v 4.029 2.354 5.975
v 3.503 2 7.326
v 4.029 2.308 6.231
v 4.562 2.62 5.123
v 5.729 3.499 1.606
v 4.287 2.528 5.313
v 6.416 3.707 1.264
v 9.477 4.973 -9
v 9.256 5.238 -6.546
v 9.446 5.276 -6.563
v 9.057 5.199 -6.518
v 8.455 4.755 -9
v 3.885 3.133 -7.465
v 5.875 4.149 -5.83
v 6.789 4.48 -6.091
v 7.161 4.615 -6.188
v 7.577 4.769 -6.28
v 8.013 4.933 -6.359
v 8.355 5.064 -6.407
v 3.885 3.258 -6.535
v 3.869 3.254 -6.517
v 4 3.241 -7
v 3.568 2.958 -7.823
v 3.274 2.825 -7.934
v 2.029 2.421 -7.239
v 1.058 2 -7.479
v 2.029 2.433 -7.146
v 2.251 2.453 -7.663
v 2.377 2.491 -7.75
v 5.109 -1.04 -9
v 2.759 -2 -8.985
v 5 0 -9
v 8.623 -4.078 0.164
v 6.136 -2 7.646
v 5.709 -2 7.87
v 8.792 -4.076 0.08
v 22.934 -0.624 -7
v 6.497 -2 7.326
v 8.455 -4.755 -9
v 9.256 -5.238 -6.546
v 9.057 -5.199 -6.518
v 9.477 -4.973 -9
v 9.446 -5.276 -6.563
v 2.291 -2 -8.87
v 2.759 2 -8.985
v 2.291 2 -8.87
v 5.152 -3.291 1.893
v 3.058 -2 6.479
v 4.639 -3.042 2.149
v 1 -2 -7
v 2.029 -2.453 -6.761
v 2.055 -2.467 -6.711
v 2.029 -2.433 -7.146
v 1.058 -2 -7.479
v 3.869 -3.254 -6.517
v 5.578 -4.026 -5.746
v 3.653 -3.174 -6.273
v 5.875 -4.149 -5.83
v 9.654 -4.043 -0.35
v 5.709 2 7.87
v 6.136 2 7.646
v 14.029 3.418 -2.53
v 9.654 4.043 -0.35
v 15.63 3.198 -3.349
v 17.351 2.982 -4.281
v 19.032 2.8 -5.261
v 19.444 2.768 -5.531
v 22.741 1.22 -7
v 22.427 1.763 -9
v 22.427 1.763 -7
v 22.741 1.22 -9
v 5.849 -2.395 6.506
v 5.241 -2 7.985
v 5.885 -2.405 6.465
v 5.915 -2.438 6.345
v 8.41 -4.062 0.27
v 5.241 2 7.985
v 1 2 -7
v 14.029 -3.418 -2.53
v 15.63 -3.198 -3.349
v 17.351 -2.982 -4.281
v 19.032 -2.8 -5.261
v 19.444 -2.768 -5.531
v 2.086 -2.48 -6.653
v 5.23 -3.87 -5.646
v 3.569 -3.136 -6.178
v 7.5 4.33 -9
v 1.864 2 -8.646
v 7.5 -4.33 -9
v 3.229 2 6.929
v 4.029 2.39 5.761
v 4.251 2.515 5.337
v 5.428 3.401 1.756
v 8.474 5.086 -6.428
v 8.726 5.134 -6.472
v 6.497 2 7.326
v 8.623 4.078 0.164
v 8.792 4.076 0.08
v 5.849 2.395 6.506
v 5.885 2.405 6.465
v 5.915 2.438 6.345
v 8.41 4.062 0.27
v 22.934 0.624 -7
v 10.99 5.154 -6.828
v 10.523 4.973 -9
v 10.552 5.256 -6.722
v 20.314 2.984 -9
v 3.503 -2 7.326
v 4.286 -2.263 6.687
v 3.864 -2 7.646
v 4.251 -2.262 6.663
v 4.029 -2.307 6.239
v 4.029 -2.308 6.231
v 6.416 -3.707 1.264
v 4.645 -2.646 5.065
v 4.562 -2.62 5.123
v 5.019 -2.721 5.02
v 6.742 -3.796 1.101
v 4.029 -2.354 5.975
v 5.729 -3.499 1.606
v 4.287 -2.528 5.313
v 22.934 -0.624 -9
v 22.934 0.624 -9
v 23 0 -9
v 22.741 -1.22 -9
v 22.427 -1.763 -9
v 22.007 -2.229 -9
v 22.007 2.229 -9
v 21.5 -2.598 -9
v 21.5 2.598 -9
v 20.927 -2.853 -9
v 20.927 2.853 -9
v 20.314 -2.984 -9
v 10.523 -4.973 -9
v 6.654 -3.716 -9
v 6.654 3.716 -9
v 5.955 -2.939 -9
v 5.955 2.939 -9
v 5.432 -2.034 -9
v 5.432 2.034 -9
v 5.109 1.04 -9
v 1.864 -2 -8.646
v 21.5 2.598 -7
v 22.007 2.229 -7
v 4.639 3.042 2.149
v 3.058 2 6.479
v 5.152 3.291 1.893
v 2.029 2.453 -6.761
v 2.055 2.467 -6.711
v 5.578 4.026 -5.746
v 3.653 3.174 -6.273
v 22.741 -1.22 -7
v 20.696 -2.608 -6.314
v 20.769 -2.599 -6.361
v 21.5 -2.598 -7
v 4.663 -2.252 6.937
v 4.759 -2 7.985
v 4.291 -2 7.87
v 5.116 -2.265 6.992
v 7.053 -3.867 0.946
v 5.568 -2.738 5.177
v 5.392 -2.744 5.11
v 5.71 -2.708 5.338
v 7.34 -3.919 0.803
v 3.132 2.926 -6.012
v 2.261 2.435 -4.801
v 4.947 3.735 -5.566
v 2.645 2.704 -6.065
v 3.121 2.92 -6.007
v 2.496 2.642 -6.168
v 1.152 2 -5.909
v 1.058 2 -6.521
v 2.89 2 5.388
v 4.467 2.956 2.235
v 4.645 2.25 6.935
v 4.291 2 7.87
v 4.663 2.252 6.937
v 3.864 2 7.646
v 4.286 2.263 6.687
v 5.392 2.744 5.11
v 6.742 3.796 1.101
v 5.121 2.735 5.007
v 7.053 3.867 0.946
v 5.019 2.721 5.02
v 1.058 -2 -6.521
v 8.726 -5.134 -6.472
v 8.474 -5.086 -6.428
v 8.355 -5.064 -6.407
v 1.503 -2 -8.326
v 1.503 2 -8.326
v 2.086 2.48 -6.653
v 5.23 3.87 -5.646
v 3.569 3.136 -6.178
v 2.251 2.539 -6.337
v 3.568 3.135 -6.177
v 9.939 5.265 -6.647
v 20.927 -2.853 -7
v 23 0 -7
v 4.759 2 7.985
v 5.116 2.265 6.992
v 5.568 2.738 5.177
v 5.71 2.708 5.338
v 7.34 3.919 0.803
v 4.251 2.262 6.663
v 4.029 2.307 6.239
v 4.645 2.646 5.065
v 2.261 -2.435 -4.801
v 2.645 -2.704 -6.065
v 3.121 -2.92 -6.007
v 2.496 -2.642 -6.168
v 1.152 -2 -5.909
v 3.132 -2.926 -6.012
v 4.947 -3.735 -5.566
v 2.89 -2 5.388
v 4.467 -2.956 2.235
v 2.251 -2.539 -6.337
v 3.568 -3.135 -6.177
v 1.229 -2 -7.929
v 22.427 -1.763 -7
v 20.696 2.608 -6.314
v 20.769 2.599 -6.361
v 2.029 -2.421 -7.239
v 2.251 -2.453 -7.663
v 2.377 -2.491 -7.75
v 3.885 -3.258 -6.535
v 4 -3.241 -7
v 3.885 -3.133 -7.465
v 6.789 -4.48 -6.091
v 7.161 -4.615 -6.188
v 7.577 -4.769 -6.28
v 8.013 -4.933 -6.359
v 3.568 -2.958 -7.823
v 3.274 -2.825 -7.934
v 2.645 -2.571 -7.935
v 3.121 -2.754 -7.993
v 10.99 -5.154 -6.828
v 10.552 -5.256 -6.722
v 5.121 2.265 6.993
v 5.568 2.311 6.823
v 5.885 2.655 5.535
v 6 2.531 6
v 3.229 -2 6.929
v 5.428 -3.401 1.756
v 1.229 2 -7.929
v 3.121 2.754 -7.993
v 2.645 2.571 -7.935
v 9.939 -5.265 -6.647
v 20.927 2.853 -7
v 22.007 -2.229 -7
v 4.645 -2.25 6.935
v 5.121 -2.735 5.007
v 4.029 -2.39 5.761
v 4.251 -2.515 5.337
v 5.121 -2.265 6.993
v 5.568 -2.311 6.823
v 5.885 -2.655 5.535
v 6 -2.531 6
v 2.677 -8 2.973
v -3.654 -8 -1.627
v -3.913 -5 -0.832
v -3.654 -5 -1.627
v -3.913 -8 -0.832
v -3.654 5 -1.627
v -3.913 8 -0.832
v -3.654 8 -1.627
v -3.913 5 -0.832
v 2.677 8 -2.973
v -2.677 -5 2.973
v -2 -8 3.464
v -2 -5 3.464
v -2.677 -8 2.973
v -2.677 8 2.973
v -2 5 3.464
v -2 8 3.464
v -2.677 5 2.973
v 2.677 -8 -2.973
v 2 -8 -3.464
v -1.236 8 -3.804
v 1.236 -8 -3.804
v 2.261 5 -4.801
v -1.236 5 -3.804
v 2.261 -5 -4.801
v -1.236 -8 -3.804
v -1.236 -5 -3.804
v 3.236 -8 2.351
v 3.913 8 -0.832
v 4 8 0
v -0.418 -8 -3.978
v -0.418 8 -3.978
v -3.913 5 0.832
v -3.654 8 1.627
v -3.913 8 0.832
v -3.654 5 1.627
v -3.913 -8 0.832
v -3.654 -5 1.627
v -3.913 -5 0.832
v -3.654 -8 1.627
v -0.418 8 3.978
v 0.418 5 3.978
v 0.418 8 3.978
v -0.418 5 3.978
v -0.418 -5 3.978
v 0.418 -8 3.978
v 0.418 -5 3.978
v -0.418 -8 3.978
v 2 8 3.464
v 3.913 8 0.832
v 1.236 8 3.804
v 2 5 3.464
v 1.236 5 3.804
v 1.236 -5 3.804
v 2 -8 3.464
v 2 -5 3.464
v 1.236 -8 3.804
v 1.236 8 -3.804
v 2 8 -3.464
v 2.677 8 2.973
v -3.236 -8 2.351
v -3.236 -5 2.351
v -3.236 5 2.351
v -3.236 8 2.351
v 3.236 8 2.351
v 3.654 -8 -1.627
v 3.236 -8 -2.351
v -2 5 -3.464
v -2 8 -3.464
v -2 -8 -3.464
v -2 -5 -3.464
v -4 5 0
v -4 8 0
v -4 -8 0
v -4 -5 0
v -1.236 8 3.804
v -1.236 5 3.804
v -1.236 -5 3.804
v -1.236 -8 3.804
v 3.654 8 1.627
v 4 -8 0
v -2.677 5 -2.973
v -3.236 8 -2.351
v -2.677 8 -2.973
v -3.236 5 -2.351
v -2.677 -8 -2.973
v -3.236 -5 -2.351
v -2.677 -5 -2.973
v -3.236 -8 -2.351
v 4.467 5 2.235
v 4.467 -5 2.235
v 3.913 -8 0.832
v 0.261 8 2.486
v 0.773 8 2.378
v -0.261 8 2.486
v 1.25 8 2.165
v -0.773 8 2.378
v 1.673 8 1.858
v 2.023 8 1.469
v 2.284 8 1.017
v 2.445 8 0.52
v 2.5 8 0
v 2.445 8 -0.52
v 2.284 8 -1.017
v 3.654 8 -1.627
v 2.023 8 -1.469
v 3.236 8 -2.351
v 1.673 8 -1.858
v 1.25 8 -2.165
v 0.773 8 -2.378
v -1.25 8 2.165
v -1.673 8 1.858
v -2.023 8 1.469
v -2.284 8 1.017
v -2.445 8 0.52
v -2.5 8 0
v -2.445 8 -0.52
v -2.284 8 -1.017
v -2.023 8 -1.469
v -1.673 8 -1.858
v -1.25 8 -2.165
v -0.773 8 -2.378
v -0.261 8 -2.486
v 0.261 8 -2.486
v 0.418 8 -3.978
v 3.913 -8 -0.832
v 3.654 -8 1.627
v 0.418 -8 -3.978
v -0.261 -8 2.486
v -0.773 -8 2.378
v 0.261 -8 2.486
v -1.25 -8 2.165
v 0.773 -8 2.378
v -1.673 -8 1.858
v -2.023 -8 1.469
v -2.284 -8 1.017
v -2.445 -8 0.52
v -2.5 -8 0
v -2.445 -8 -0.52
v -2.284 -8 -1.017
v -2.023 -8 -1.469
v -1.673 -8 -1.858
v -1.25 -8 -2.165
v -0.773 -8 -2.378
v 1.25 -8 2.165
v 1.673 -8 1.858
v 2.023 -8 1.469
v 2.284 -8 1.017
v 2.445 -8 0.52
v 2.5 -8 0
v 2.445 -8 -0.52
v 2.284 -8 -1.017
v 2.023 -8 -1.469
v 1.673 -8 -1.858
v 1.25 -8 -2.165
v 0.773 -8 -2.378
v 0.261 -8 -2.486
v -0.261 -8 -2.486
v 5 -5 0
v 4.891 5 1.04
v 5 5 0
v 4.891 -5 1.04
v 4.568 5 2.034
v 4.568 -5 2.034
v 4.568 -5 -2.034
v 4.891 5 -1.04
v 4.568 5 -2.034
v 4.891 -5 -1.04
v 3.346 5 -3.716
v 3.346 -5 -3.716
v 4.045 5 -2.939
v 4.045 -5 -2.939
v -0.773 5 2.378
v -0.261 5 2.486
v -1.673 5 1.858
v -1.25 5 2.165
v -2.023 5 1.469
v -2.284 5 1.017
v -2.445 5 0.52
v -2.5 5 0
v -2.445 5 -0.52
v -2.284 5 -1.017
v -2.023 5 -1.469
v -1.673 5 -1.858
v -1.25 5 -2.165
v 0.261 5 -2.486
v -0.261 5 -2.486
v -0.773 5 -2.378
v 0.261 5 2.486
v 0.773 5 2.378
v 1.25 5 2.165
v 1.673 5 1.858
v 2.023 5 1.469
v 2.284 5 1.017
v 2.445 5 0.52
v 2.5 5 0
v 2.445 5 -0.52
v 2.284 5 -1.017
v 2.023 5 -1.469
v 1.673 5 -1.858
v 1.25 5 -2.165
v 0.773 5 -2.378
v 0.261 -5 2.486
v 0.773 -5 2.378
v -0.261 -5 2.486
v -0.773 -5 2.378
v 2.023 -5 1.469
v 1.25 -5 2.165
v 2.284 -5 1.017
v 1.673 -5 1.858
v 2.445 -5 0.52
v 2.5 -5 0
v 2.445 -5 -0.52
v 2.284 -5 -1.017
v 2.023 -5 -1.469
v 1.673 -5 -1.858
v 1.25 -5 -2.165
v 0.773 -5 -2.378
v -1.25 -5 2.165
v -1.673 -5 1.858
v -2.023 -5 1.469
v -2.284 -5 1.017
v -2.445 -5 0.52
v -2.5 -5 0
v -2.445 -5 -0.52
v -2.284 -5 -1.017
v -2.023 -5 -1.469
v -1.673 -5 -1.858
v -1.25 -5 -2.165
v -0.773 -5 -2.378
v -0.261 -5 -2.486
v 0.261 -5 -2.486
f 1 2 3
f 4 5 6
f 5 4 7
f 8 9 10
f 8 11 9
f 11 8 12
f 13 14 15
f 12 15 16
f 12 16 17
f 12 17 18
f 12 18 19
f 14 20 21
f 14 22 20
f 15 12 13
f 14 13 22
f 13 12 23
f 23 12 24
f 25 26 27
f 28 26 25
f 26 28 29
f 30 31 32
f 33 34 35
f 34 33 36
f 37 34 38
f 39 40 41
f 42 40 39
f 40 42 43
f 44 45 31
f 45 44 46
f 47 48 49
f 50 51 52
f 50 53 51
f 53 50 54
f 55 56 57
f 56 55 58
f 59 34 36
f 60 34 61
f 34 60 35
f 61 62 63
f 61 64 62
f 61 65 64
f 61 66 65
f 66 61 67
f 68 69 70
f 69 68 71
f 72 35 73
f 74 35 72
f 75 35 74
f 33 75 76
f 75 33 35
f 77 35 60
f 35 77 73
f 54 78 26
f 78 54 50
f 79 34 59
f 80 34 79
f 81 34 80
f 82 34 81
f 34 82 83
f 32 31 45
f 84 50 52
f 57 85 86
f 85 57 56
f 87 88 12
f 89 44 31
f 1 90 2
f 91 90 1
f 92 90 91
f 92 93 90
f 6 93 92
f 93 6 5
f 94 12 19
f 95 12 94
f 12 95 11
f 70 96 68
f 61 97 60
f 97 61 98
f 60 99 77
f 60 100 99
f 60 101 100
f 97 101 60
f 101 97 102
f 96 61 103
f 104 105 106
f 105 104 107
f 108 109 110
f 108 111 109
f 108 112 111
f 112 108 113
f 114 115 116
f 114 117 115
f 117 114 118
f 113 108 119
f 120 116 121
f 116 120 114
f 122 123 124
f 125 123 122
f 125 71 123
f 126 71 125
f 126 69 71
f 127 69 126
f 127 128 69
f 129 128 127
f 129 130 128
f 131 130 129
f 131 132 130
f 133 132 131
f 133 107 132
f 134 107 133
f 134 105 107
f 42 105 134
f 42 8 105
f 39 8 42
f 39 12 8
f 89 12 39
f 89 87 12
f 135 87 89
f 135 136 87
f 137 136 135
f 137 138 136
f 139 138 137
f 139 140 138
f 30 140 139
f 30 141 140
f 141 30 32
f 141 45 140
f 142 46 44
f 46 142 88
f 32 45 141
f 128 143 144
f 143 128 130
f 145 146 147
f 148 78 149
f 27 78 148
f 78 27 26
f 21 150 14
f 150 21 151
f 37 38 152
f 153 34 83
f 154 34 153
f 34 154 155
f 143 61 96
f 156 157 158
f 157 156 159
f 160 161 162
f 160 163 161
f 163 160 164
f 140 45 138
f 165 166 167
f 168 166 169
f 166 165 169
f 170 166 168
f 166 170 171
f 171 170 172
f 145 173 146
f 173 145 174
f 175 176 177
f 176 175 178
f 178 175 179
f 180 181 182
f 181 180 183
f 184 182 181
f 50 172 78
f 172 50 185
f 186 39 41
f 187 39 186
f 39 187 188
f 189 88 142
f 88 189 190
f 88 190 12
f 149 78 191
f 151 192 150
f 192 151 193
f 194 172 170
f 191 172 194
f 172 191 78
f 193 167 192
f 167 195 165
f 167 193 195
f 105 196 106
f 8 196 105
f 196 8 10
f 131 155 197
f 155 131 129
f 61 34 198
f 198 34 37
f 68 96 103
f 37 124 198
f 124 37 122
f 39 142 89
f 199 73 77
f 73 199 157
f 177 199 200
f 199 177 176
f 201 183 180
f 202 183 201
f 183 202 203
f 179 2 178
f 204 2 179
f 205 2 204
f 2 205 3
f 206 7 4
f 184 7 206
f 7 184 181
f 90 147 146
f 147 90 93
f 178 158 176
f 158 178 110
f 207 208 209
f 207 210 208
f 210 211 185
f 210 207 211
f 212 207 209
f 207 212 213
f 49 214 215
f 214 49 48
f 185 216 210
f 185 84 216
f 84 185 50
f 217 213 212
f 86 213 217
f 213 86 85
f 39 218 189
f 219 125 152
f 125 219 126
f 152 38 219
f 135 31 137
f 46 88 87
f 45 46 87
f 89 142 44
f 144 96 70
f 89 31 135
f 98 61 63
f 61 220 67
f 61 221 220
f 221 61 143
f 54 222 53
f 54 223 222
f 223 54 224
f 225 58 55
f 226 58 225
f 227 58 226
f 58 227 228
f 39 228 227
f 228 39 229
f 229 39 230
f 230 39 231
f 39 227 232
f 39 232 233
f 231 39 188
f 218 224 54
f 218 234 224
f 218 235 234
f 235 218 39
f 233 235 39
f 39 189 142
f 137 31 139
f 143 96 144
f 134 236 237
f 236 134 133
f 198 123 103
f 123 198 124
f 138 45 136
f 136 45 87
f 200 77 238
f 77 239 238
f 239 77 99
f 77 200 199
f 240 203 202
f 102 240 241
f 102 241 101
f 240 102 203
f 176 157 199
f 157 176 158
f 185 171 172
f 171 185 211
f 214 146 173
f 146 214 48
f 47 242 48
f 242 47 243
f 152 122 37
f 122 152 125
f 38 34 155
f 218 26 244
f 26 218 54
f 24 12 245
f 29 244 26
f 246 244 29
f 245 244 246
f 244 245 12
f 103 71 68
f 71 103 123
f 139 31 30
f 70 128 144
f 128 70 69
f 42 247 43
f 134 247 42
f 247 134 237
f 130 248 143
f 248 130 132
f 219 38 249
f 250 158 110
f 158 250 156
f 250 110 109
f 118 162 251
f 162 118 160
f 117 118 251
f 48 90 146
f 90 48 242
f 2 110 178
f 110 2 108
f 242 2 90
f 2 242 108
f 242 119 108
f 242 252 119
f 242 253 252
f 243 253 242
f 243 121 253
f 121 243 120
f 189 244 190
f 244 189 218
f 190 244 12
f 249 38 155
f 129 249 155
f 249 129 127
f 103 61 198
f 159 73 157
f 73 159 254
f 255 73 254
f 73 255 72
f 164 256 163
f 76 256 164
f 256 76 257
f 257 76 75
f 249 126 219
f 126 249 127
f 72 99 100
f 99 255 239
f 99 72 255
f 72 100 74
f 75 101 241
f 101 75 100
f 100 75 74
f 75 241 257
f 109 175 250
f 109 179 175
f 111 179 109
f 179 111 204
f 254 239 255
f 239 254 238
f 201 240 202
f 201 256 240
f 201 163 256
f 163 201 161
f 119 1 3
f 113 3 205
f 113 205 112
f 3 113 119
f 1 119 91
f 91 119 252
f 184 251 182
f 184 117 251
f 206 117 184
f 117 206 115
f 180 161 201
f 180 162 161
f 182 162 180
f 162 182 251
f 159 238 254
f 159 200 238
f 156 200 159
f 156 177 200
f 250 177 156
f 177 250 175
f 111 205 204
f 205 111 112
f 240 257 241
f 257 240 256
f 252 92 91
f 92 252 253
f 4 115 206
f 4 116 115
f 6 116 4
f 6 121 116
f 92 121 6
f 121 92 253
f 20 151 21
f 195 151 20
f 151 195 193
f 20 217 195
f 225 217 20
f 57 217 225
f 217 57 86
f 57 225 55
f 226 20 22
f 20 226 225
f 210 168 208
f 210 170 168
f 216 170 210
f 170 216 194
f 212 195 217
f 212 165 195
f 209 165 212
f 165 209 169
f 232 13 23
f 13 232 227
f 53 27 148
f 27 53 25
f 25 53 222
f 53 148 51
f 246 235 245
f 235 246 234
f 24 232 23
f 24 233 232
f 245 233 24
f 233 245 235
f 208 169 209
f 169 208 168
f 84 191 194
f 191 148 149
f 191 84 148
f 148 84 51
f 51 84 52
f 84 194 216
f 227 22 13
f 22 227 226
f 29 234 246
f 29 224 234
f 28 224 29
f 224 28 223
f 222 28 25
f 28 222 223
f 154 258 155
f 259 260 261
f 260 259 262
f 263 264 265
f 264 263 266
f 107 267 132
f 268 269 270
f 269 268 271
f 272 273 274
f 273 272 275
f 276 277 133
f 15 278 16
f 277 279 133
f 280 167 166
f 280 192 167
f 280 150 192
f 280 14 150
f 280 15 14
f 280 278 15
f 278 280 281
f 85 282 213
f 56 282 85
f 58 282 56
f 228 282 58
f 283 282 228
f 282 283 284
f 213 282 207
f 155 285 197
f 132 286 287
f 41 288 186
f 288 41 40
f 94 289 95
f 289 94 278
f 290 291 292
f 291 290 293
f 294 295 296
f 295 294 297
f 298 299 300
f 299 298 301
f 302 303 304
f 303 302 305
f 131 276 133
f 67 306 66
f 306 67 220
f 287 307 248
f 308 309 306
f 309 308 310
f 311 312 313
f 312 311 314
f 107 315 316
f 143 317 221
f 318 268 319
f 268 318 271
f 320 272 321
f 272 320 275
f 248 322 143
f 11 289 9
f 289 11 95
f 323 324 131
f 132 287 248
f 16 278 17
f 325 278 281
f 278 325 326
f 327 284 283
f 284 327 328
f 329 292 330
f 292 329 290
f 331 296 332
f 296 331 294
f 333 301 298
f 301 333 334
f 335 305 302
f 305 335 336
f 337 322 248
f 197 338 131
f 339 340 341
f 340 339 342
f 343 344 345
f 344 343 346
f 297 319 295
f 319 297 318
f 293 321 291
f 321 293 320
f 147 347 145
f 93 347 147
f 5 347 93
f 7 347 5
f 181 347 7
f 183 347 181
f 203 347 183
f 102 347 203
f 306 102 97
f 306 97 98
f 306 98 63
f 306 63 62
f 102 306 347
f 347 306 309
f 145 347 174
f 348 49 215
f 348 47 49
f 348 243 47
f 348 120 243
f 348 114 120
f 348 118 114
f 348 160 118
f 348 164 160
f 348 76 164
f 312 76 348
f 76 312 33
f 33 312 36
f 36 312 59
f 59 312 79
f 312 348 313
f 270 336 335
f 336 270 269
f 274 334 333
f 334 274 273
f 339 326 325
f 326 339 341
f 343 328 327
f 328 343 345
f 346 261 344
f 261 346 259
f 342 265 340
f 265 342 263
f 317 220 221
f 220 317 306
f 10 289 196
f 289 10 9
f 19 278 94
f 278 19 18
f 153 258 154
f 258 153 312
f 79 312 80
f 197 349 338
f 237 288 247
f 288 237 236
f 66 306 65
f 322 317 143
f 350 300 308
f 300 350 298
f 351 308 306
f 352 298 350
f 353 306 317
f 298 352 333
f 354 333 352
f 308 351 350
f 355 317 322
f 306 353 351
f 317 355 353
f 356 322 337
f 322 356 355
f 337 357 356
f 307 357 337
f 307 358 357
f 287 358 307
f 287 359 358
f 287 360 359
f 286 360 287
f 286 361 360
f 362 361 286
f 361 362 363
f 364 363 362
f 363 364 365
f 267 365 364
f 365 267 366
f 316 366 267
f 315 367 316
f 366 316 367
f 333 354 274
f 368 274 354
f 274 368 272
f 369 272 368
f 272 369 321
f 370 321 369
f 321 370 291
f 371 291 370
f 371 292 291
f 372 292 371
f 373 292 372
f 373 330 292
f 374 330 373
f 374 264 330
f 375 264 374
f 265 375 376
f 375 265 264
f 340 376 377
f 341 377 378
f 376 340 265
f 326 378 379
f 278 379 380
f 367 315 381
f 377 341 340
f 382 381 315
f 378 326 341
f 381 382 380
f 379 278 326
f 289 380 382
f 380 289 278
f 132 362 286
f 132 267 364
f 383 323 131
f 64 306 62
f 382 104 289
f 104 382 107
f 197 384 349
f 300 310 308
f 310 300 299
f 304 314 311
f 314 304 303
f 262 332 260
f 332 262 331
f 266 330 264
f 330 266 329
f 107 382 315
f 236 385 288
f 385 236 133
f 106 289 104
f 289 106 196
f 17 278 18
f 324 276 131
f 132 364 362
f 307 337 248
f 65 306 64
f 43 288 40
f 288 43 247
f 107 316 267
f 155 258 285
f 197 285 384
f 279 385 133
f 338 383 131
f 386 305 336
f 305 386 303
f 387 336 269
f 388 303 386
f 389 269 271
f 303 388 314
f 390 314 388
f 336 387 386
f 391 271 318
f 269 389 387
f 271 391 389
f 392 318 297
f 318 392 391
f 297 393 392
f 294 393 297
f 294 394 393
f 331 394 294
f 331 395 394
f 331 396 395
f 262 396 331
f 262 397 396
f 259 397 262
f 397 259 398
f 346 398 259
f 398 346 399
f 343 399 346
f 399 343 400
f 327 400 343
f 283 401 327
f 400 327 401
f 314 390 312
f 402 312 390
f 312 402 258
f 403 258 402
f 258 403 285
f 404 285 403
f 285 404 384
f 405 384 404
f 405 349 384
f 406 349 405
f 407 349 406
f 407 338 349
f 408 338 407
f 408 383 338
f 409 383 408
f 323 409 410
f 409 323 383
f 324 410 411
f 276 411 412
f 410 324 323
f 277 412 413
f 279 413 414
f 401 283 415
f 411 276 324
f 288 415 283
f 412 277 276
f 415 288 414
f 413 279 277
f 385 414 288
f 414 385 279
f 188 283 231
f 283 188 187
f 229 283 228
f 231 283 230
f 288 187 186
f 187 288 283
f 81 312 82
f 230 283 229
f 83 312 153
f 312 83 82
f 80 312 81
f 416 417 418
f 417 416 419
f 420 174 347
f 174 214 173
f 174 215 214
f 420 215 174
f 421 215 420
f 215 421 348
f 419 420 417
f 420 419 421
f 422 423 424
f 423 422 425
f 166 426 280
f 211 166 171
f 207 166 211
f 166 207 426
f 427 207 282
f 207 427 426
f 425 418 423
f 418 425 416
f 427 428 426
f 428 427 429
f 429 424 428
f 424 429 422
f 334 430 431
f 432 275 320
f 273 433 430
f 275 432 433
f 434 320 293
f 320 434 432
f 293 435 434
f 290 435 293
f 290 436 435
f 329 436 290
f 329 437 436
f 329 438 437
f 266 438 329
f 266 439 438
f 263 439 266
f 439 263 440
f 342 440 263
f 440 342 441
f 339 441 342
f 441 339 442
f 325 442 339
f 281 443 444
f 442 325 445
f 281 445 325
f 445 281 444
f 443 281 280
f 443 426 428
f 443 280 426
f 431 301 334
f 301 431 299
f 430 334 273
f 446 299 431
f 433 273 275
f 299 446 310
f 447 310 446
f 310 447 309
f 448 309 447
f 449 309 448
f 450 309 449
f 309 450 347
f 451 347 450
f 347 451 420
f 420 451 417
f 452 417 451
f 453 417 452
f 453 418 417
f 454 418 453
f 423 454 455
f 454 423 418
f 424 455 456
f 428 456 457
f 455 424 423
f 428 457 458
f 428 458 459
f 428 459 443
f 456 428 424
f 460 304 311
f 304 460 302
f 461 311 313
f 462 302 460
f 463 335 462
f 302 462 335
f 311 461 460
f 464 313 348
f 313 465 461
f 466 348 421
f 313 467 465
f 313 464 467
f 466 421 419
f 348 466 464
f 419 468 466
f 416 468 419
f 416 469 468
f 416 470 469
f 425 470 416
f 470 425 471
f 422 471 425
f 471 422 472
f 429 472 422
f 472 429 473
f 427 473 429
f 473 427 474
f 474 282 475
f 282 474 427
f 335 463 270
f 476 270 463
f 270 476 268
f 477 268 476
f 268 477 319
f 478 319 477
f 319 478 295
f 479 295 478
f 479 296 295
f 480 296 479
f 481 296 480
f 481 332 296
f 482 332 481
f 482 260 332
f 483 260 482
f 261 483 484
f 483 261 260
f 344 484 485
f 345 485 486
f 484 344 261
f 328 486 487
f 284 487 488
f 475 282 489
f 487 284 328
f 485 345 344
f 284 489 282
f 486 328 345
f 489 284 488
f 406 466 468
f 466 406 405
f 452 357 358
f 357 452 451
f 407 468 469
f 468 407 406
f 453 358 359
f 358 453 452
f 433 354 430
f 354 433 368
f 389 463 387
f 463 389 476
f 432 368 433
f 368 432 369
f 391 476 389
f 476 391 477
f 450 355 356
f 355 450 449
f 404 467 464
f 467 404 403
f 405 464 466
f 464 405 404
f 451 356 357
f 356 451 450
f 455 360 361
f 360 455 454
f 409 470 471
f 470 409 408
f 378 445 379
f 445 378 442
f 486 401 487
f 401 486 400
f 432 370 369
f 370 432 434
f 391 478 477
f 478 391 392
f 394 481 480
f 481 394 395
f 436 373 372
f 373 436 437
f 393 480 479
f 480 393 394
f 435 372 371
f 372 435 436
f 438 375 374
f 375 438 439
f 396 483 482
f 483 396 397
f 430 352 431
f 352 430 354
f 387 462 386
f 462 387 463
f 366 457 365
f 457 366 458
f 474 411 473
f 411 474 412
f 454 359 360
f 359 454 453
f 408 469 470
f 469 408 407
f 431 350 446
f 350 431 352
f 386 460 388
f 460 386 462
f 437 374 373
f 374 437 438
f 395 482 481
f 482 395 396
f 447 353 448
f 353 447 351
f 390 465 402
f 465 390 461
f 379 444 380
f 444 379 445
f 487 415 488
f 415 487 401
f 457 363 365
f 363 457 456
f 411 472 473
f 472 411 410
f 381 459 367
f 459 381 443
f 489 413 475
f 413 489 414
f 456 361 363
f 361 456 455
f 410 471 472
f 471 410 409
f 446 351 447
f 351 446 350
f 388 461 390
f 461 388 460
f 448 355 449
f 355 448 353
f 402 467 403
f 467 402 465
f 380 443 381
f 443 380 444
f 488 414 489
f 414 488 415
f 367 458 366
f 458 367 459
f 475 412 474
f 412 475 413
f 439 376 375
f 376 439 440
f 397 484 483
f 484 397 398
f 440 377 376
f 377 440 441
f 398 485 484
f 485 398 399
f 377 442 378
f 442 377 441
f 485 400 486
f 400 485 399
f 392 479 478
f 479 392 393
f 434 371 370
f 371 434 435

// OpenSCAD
// file: ../modules/foot-common-parts.scad
module jointUpper() {
    difference() {
        hull() {
            children();
            rotate([90,0,0])
            translate([0,0,-8])
            cylinder(r=4,h=16); 
        }
         hull(){
            rotate([90,0,0]) {
                translate([0,0,-5])
                cylinder(h=10,r=5);
                translate([-5,10,-5])
                cylinder(h=10,r=5);

                translate([-5,-5,-5])
                cylinder(h=10,r=5);

            }
        }
        rotate([90,0,0])
        translate([0,0,-10]){
            cylinder(h=20,r=2.5);
        }
    }
}

module jointLower(x) {
    difference() {
    hull() {
                rotate([90,0,0])
                translate([x,0,-4.9])
                cylinder(h=9.8,r=4);
                
                rotate([90,0,0])
                translate([x-6,0,-4.9])
                cylinder(h=9.8,r=4);
                
                
            }
            rotate([90,0,0])
            translate([x,0,-8])
            cylinder(h=16,r=2.4);
        }
}

//creates a cylinder from [x1,y1,z1] to [x2,y2,z2] with radius r
module pointCylinder(x1,y1,z1,x2,y2,z2,r, extend=false) {
    x= x2-x1;
    y= y2-y1;
    z= z2-z1;
    
    x_vect = [y,-x,0]; // = cross([x,y,z],[0,0,1])

    y_vect = cross([x,y,z],x_vect);

    m = [
    [y/norm(x_vect),y_vect[0]/norm(y_vect),x,x1],
    [-x/norm(x_vect),y_vect[1]/ norm(y_vect),y,y1],
    [0,y_vect[2]/ norm(y_vect),z,z1],
    [0,0,0,1]
    ];

    multmatrix(m)
    if (extend){
        translate([0,0,-1])
        cylinder(r=r,h=3);
        }
    else 
    {cylinder(r=r,h=1);}
}

 module offset_3d(r=1, size=1000) {
     n = $fn==undef ? 12: $fn;
     if(r==0) children();
     else 
         if( r>0 )
             minkowski(convexity=5){
                 children();
                 sphere(r, $fn=n);
             }
         else {
             size2 = size*[1,1,1];// this will form the positv
             size1 = size2*2;    // this will hold a negative inside
             difference(){
                 cube(size2, center=true);// forms the positiv by substracting the negative
                 minkowski(convexity=5){
                     difference(){
                         cube(size1, center=true);
                         children();
                     }
                     sphere(-r, $fn=n);
                 }
             }
         }
 }

module tendonTube (x1,y1,z1,x2,y2,z2,smooth=true) {
    difference() {
        
            hull() {
            pointCylinder(x1,y1,z1,x2,y2,z2,2);
            children();
            
            }
            if (smooth) {
                difference() {
                    pointCylinder(x1,y1,z1,x2,y2,z2,1.5, true);
                    offset_3d(0.5)
                    offset_3d(-0.5)
                    difference(){
                        hull(){
                            pointCylinder(x1,y1,z1,x2,y2,z2,2);
                            children();
                        }
                        pointCylinder(x1,y1,z1,x2,y2,z2,1, true);
                    }    
               }
           }
           else {
               pointCylinder(x1,y1,z1,x2,y2,z2,1, true);
           }
        }
    }
    
module tendonAttachments (x1,z1,x2,z2) {
    difference() {
        hull() {
            children();
            translate([x1,0,z1])
            rotate([90,0,0])
            translate([0,0,-2])
            cylinder(r=2,h=4); 
            translate([x2,0,z2])
            rotate([90,0,0])
            translate([0,0,-2])
            cylinder(r=2,h=4);            
        }
        translate([x1,0,z1])
        rotate([90,0,0])
        translate([0,0,-10])
        cylinder(h=20,r=1);
        
        translate([x2,0,z2])
        rotate([90,0,0])
        translate([0,0,-10])
        cylinder(h=20,r=1);
    }
}
// main file
$fs = 0.5;
use <../modules/foot-common-parts.scad>

module phalanx2() {
    difference() {
        union() {
            tendonAttachments(5,6,3,-7){
                translate([20,0,-9])
                cylinder(r=3,h=2);
                translate([10,0,-9])
                cylinder(r1=5,r2=5.5,h=4);  
            }
            jointUpper() {
                translate([20,0,-9])
                cylinder(r=3,h=2); 
            }
        }
        
        hull(){
            rotate([90,0,0]) {
                translate([0,0,-5])
                cylinder(h=10,r=5);
                translate([-5,10,-5])
                cylinder(h=10,r=5);

                translate([-5,-5,-5])
                cylinder(h=10,r=5);
            }
        }
        
    }
}

phalanx2();
